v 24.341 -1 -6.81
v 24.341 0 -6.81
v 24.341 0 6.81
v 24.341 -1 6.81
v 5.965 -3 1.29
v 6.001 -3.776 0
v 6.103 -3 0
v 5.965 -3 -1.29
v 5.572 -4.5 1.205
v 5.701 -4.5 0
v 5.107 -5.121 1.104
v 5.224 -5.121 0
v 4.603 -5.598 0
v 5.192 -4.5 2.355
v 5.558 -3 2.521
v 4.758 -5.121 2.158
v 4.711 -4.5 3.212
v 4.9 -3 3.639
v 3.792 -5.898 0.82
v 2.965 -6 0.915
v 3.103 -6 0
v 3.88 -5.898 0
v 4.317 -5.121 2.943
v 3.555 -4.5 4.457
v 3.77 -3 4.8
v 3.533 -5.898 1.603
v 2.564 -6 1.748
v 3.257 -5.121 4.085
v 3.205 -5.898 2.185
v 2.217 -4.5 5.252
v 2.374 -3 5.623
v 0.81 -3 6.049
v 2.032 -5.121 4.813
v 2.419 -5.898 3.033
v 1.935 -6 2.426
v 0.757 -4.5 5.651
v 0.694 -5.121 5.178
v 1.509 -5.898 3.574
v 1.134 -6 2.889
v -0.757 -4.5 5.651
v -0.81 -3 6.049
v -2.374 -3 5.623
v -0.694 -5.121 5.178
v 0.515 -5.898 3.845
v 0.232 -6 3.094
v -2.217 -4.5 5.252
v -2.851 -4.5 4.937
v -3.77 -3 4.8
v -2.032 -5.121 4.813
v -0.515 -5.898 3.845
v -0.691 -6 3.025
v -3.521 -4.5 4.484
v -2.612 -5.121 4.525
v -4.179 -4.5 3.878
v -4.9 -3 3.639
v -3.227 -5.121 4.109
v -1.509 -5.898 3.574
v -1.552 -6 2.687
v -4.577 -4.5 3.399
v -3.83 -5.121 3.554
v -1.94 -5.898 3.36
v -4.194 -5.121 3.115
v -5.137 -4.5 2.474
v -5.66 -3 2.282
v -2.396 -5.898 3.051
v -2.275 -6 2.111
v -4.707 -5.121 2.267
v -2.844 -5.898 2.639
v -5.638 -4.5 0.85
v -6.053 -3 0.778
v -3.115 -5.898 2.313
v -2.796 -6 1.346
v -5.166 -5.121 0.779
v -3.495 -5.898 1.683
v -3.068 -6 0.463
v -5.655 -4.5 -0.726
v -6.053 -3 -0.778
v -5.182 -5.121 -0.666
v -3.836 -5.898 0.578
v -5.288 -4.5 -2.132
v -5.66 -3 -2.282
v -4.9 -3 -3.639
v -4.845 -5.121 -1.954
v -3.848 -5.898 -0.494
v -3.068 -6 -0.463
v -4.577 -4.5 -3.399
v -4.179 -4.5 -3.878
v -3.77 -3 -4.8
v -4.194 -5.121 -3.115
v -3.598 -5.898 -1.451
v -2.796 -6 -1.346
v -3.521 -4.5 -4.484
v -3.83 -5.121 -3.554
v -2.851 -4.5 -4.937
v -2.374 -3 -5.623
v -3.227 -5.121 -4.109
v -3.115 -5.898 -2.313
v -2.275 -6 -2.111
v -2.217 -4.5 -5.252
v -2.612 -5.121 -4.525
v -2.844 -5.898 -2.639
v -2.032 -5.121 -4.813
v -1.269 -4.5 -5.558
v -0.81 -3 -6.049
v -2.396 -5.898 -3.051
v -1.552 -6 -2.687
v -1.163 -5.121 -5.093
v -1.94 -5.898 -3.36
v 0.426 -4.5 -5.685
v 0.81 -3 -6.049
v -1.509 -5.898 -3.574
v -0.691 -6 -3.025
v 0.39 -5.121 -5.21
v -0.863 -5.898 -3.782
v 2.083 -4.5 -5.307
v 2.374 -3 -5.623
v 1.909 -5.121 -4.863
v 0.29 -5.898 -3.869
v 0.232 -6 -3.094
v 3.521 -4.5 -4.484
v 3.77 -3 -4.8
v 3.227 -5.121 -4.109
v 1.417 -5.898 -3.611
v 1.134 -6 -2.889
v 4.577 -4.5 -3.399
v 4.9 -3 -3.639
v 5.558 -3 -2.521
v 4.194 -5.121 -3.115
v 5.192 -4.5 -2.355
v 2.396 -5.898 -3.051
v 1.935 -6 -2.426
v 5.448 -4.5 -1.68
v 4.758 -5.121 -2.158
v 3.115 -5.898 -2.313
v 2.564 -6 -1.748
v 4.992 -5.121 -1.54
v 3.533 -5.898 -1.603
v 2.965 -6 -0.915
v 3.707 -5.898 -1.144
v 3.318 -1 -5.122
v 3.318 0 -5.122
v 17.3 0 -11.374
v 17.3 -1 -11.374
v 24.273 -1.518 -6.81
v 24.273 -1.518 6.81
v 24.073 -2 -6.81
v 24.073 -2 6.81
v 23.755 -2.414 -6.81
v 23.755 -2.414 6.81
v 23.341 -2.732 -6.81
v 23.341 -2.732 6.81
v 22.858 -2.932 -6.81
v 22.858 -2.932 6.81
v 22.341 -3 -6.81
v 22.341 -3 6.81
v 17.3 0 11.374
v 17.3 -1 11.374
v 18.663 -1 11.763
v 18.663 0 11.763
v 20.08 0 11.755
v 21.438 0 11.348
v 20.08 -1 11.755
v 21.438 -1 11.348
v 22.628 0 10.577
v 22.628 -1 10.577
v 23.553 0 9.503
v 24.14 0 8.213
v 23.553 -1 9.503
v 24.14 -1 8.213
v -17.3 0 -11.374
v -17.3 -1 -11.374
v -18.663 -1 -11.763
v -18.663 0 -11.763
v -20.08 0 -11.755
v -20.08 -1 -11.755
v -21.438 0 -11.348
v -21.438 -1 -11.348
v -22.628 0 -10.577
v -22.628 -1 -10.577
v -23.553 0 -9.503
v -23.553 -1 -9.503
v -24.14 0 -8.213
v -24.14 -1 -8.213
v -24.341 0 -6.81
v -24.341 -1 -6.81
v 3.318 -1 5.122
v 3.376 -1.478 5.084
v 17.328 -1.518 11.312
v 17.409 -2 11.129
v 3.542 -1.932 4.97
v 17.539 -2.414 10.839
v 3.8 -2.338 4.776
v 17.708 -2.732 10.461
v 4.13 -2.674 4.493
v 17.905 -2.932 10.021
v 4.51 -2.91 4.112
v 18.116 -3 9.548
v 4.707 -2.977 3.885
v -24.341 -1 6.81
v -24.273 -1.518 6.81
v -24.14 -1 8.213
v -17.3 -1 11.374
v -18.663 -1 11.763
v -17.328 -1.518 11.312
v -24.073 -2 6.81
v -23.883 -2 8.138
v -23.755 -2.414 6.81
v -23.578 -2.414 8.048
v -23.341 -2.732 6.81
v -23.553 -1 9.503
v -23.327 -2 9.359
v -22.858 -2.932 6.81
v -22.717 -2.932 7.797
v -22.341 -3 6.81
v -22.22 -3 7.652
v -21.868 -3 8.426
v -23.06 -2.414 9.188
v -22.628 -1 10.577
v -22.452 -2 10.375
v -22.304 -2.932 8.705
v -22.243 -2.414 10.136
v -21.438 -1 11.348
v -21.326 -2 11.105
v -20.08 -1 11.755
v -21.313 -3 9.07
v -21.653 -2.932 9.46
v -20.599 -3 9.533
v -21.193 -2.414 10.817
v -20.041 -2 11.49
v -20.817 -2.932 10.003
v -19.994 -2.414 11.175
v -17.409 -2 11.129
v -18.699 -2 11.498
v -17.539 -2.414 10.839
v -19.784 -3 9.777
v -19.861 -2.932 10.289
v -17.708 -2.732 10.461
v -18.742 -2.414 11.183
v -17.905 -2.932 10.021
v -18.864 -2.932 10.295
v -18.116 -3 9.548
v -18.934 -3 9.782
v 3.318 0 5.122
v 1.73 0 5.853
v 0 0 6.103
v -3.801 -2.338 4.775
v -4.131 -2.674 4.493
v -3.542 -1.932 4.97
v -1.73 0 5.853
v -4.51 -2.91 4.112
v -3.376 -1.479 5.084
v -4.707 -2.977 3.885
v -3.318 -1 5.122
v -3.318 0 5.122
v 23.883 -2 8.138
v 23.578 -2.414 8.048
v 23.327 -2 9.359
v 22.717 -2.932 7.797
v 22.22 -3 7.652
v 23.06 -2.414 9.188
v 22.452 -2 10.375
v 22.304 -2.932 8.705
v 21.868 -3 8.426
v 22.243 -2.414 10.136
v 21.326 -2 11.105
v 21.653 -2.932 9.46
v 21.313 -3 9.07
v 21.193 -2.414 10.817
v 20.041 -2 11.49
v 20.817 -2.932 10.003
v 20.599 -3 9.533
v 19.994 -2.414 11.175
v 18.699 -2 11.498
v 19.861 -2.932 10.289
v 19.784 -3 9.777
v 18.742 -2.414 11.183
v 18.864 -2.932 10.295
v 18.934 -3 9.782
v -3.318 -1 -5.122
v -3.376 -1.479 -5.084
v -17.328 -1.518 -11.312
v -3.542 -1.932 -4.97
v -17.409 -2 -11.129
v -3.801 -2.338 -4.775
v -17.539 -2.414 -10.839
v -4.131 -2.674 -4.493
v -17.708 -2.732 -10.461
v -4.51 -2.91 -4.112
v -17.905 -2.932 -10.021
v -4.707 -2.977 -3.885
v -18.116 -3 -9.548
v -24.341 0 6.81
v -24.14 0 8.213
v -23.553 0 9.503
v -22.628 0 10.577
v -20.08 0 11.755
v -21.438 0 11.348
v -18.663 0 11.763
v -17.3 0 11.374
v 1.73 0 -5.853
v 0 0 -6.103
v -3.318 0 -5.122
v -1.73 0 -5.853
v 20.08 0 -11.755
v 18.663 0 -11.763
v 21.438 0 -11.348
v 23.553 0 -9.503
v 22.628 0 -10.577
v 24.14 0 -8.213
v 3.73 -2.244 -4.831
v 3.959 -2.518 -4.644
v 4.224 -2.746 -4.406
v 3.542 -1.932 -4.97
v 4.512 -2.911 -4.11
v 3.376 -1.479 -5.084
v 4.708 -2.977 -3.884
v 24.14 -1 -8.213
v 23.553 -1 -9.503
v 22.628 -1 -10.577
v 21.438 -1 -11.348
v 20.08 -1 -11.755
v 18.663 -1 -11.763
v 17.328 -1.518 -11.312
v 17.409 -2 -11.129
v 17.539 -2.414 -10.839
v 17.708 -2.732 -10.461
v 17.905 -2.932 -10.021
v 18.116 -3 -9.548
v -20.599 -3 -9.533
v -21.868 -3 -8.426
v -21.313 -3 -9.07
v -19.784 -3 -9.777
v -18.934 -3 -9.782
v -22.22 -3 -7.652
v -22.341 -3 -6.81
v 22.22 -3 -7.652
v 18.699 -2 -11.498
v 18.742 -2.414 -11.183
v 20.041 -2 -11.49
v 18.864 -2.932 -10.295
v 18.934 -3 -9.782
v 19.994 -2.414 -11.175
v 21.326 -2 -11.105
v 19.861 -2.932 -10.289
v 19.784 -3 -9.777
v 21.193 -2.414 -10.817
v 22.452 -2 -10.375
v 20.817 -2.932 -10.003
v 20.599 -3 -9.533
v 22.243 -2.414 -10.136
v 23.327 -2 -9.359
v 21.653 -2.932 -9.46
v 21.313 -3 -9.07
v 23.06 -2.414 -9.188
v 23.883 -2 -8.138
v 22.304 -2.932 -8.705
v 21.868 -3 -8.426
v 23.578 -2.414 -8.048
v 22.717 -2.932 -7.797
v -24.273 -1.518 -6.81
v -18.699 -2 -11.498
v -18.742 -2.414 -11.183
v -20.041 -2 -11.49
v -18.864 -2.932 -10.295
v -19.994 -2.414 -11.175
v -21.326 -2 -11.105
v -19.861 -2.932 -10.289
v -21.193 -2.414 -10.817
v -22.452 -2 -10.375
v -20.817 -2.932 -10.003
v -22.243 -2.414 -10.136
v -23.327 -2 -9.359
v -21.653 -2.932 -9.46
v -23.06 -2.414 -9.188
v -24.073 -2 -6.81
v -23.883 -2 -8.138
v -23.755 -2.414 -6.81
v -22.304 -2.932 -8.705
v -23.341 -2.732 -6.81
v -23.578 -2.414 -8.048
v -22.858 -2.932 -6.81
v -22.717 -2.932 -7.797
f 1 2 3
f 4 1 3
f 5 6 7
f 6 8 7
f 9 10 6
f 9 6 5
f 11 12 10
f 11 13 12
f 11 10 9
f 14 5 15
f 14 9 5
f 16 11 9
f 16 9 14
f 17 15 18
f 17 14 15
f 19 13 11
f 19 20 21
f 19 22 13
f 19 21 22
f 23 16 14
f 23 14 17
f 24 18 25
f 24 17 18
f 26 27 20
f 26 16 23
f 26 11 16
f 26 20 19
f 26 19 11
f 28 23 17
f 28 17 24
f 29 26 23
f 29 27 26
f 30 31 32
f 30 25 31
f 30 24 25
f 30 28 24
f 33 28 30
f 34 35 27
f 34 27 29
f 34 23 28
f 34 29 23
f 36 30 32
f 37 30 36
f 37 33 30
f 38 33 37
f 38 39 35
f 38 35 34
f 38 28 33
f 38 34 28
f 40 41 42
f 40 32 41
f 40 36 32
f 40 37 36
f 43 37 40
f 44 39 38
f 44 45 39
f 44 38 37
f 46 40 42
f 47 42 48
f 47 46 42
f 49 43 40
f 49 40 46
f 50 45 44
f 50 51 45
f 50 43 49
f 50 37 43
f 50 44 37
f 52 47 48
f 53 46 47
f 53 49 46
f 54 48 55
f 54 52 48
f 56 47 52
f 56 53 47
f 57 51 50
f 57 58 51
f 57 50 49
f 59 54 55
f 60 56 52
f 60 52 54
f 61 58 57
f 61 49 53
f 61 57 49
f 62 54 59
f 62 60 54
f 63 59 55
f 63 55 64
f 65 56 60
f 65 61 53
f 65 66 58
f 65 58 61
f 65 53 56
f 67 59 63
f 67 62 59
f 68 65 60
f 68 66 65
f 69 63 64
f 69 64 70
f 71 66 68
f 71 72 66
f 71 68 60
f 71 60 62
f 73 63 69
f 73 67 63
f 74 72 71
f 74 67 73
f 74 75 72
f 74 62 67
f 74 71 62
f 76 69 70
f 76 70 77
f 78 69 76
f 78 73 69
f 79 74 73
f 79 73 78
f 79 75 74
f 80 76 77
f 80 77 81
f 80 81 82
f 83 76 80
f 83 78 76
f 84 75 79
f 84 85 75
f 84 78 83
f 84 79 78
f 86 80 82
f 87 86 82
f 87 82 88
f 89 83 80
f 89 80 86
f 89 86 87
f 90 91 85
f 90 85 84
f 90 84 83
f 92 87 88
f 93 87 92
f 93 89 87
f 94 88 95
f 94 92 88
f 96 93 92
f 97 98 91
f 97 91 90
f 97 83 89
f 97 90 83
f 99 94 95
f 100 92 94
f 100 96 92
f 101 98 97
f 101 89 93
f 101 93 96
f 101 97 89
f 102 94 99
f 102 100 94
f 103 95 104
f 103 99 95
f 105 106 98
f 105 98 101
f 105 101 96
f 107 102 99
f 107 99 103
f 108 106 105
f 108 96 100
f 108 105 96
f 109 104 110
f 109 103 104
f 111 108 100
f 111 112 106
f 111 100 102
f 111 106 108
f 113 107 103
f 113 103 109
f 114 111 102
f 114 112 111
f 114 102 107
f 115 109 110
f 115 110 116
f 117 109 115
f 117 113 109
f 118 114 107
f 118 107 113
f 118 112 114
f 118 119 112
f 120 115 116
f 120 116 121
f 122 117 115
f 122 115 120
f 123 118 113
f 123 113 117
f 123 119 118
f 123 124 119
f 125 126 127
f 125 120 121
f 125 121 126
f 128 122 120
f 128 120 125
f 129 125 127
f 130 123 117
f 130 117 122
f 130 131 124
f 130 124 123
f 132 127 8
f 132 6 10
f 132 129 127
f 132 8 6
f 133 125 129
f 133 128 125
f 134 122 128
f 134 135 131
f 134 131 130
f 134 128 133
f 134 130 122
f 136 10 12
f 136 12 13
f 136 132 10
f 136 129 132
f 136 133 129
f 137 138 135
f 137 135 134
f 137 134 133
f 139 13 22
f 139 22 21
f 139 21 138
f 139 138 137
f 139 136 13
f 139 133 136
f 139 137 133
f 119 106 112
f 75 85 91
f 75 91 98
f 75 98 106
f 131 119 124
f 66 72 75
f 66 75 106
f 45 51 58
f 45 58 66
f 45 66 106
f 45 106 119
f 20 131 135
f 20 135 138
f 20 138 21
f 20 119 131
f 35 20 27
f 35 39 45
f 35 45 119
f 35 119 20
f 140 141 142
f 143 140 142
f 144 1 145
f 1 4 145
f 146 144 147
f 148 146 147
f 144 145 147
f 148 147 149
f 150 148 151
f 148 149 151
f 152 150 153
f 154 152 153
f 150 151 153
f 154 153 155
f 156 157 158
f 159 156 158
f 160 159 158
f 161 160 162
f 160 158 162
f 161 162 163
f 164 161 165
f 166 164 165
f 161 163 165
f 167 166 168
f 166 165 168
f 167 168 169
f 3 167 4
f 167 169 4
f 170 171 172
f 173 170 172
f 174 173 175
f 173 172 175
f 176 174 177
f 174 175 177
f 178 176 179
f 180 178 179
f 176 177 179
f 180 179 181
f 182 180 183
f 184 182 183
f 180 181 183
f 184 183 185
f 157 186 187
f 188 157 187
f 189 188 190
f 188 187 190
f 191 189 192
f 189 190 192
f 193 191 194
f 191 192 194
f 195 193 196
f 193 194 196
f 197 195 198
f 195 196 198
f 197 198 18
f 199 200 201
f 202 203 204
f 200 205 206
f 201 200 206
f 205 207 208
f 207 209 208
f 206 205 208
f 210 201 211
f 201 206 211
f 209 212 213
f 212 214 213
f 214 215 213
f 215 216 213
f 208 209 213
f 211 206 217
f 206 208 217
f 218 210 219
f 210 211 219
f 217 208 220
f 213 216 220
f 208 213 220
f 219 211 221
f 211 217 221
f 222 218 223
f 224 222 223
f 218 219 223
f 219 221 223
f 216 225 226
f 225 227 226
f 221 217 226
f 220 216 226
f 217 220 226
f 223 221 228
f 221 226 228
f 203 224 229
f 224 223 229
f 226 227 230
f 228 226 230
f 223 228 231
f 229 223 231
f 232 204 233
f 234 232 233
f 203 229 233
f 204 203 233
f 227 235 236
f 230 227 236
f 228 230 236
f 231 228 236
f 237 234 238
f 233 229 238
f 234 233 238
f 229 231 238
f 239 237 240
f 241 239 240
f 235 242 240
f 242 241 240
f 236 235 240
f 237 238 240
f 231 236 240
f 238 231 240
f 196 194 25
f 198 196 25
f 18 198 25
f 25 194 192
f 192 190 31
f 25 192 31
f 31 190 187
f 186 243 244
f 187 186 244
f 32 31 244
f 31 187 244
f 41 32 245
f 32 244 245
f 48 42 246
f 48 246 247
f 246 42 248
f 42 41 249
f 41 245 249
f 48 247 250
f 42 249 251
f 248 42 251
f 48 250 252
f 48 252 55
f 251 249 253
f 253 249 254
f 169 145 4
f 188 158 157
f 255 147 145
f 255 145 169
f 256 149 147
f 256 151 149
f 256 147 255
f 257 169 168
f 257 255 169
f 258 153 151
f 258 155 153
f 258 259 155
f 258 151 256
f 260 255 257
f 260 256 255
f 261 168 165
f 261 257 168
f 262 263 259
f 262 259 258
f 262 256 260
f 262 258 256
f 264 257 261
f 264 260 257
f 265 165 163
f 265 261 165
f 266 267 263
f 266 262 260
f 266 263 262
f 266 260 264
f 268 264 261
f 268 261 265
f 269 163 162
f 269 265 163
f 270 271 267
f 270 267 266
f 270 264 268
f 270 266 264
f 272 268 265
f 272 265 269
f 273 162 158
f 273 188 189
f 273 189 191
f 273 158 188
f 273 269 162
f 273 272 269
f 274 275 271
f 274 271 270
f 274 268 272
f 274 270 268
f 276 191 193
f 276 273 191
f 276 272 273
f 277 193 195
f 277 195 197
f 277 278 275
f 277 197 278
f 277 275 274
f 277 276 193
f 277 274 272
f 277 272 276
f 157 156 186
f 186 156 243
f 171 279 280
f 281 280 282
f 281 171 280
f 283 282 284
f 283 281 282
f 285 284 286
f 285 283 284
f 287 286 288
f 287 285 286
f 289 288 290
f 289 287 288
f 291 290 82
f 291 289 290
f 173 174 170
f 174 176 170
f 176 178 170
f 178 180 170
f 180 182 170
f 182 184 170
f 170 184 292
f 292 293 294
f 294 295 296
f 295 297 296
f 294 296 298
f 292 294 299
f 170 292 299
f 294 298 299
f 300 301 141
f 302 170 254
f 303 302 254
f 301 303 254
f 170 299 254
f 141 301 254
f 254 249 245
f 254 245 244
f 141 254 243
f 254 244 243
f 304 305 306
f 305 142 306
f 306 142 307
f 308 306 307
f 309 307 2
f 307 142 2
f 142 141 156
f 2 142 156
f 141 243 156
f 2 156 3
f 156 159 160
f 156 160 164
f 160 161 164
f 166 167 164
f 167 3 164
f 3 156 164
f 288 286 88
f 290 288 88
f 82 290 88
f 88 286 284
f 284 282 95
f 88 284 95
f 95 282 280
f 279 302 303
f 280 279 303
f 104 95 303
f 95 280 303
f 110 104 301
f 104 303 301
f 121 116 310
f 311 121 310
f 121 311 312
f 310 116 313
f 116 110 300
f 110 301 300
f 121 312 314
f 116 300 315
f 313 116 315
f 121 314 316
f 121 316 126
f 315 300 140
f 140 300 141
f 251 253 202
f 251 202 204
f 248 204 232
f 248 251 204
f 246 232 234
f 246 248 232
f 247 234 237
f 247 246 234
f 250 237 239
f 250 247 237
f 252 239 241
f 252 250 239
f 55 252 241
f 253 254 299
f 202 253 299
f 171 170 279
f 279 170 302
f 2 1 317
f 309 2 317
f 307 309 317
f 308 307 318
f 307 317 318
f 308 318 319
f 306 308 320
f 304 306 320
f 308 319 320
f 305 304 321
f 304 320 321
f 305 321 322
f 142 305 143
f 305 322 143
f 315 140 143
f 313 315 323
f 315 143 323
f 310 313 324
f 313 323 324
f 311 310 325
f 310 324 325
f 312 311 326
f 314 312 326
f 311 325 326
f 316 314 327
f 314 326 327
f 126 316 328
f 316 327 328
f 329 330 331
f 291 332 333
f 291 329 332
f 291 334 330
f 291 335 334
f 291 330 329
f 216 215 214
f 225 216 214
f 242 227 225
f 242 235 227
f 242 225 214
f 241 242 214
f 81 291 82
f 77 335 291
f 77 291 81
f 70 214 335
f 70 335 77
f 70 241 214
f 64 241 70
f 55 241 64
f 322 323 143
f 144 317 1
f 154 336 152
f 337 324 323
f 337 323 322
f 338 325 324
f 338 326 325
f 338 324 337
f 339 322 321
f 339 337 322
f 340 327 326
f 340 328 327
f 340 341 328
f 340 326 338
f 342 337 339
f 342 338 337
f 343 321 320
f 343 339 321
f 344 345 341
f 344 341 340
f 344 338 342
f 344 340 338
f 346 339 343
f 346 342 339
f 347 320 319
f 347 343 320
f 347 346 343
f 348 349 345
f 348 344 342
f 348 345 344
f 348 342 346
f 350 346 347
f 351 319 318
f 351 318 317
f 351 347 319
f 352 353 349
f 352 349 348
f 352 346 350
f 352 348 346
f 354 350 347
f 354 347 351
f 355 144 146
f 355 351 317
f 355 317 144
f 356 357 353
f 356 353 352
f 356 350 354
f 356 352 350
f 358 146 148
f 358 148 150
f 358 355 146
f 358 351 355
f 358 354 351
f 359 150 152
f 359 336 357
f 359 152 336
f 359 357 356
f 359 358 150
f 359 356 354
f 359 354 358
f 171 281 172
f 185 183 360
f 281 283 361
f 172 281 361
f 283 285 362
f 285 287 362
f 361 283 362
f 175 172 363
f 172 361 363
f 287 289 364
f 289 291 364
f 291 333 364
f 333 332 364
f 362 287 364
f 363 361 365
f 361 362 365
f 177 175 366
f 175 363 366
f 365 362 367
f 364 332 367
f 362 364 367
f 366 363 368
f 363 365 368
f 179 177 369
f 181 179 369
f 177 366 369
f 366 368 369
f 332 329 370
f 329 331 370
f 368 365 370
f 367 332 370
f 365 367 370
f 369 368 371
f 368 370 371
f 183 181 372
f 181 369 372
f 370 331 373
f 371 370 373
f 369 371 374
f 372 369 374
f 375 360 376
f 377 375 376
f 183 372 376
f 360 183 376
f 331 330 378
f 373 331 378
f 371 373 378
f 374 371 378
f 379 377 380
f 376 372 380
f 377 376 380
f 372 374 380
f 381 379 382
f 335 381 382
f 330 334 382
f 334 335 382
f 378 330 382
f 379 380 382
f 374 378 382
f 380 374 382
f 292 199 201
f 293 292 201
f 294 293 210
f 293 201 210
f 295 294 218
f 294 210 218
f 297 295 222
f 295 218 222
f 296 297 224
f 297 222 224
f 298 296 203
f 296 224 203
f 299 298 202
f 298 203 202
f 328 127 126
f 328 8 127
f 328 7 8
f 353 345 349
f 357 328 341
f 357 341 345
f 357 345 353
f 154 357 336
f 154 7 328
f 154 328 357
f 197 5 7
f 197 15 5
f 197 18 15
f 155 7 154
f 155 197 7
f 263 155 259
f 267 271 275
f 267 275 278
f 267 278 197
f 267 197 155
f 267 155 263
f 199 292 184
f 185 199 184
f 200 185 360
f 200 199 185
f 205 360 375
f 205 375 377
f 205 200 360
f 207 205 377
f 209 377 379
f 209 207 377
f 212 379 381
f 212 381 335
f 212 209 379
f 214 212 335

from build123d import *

# Parameters (mm, degrees)
F0_R     = 6.1031552094
F2_DEPTH = 6
F3_R     = 3
F4_DEPTH = 3
F5_R     = 5
F6_R     = 2


with BuildPart() as f2:
    # F0 (on Front) → F2 (new body)
    with BuildSketch(Plane.XZ):
        Circle(F0_R)
    extrude(amount=F2_DEPTH)

    # F3
    f3_edges = [f2.edges().sort_by_distance(p)[0] for p in [
        (-6.103155, -6, 0),
    ]]
    fillet(f3_edges, radius=F3_R)

    # F1 (on Front) → F4 (join)
    with BuildSketch(Plane.XZ):
        Polygon((-3.1815413386, -5.0610057078), (3.1815413386, -5.0610057078), (24.3407674134, -14.5224481821), (24.3407674134, 14.5224481821), (3.1815413386, 5.0610057078), (-3.1815413386, 5.0610057078), (-24.3407674134, 14.5224481821), (-24.3407674134, -14.5224481821), align=None)
    extrude(amount=F4_DEPTH)

    # F5
    f5_edges = [f2.edges().sort_by_distance(p)[0] for p in [
        (24.340767, -1.5, 14.522448),
        (24.340767, -1.5, -14.522448),
        (-24.340767, -1.5, -14.522448),
        (-24.340767, -1.5, 14.522448),
    ]]
    fillet(f5_edges, radius=F5_R)

    # F6
    f6_edges = [f2.edges().sort_by_distance(p)[0] for p in [
        (-22.060594, -3, -11.005109),
        (10.309065, -3, 8.24811),
    ]]
    fillet(f6_edges, radius=F6_R)


solid = f2.part
